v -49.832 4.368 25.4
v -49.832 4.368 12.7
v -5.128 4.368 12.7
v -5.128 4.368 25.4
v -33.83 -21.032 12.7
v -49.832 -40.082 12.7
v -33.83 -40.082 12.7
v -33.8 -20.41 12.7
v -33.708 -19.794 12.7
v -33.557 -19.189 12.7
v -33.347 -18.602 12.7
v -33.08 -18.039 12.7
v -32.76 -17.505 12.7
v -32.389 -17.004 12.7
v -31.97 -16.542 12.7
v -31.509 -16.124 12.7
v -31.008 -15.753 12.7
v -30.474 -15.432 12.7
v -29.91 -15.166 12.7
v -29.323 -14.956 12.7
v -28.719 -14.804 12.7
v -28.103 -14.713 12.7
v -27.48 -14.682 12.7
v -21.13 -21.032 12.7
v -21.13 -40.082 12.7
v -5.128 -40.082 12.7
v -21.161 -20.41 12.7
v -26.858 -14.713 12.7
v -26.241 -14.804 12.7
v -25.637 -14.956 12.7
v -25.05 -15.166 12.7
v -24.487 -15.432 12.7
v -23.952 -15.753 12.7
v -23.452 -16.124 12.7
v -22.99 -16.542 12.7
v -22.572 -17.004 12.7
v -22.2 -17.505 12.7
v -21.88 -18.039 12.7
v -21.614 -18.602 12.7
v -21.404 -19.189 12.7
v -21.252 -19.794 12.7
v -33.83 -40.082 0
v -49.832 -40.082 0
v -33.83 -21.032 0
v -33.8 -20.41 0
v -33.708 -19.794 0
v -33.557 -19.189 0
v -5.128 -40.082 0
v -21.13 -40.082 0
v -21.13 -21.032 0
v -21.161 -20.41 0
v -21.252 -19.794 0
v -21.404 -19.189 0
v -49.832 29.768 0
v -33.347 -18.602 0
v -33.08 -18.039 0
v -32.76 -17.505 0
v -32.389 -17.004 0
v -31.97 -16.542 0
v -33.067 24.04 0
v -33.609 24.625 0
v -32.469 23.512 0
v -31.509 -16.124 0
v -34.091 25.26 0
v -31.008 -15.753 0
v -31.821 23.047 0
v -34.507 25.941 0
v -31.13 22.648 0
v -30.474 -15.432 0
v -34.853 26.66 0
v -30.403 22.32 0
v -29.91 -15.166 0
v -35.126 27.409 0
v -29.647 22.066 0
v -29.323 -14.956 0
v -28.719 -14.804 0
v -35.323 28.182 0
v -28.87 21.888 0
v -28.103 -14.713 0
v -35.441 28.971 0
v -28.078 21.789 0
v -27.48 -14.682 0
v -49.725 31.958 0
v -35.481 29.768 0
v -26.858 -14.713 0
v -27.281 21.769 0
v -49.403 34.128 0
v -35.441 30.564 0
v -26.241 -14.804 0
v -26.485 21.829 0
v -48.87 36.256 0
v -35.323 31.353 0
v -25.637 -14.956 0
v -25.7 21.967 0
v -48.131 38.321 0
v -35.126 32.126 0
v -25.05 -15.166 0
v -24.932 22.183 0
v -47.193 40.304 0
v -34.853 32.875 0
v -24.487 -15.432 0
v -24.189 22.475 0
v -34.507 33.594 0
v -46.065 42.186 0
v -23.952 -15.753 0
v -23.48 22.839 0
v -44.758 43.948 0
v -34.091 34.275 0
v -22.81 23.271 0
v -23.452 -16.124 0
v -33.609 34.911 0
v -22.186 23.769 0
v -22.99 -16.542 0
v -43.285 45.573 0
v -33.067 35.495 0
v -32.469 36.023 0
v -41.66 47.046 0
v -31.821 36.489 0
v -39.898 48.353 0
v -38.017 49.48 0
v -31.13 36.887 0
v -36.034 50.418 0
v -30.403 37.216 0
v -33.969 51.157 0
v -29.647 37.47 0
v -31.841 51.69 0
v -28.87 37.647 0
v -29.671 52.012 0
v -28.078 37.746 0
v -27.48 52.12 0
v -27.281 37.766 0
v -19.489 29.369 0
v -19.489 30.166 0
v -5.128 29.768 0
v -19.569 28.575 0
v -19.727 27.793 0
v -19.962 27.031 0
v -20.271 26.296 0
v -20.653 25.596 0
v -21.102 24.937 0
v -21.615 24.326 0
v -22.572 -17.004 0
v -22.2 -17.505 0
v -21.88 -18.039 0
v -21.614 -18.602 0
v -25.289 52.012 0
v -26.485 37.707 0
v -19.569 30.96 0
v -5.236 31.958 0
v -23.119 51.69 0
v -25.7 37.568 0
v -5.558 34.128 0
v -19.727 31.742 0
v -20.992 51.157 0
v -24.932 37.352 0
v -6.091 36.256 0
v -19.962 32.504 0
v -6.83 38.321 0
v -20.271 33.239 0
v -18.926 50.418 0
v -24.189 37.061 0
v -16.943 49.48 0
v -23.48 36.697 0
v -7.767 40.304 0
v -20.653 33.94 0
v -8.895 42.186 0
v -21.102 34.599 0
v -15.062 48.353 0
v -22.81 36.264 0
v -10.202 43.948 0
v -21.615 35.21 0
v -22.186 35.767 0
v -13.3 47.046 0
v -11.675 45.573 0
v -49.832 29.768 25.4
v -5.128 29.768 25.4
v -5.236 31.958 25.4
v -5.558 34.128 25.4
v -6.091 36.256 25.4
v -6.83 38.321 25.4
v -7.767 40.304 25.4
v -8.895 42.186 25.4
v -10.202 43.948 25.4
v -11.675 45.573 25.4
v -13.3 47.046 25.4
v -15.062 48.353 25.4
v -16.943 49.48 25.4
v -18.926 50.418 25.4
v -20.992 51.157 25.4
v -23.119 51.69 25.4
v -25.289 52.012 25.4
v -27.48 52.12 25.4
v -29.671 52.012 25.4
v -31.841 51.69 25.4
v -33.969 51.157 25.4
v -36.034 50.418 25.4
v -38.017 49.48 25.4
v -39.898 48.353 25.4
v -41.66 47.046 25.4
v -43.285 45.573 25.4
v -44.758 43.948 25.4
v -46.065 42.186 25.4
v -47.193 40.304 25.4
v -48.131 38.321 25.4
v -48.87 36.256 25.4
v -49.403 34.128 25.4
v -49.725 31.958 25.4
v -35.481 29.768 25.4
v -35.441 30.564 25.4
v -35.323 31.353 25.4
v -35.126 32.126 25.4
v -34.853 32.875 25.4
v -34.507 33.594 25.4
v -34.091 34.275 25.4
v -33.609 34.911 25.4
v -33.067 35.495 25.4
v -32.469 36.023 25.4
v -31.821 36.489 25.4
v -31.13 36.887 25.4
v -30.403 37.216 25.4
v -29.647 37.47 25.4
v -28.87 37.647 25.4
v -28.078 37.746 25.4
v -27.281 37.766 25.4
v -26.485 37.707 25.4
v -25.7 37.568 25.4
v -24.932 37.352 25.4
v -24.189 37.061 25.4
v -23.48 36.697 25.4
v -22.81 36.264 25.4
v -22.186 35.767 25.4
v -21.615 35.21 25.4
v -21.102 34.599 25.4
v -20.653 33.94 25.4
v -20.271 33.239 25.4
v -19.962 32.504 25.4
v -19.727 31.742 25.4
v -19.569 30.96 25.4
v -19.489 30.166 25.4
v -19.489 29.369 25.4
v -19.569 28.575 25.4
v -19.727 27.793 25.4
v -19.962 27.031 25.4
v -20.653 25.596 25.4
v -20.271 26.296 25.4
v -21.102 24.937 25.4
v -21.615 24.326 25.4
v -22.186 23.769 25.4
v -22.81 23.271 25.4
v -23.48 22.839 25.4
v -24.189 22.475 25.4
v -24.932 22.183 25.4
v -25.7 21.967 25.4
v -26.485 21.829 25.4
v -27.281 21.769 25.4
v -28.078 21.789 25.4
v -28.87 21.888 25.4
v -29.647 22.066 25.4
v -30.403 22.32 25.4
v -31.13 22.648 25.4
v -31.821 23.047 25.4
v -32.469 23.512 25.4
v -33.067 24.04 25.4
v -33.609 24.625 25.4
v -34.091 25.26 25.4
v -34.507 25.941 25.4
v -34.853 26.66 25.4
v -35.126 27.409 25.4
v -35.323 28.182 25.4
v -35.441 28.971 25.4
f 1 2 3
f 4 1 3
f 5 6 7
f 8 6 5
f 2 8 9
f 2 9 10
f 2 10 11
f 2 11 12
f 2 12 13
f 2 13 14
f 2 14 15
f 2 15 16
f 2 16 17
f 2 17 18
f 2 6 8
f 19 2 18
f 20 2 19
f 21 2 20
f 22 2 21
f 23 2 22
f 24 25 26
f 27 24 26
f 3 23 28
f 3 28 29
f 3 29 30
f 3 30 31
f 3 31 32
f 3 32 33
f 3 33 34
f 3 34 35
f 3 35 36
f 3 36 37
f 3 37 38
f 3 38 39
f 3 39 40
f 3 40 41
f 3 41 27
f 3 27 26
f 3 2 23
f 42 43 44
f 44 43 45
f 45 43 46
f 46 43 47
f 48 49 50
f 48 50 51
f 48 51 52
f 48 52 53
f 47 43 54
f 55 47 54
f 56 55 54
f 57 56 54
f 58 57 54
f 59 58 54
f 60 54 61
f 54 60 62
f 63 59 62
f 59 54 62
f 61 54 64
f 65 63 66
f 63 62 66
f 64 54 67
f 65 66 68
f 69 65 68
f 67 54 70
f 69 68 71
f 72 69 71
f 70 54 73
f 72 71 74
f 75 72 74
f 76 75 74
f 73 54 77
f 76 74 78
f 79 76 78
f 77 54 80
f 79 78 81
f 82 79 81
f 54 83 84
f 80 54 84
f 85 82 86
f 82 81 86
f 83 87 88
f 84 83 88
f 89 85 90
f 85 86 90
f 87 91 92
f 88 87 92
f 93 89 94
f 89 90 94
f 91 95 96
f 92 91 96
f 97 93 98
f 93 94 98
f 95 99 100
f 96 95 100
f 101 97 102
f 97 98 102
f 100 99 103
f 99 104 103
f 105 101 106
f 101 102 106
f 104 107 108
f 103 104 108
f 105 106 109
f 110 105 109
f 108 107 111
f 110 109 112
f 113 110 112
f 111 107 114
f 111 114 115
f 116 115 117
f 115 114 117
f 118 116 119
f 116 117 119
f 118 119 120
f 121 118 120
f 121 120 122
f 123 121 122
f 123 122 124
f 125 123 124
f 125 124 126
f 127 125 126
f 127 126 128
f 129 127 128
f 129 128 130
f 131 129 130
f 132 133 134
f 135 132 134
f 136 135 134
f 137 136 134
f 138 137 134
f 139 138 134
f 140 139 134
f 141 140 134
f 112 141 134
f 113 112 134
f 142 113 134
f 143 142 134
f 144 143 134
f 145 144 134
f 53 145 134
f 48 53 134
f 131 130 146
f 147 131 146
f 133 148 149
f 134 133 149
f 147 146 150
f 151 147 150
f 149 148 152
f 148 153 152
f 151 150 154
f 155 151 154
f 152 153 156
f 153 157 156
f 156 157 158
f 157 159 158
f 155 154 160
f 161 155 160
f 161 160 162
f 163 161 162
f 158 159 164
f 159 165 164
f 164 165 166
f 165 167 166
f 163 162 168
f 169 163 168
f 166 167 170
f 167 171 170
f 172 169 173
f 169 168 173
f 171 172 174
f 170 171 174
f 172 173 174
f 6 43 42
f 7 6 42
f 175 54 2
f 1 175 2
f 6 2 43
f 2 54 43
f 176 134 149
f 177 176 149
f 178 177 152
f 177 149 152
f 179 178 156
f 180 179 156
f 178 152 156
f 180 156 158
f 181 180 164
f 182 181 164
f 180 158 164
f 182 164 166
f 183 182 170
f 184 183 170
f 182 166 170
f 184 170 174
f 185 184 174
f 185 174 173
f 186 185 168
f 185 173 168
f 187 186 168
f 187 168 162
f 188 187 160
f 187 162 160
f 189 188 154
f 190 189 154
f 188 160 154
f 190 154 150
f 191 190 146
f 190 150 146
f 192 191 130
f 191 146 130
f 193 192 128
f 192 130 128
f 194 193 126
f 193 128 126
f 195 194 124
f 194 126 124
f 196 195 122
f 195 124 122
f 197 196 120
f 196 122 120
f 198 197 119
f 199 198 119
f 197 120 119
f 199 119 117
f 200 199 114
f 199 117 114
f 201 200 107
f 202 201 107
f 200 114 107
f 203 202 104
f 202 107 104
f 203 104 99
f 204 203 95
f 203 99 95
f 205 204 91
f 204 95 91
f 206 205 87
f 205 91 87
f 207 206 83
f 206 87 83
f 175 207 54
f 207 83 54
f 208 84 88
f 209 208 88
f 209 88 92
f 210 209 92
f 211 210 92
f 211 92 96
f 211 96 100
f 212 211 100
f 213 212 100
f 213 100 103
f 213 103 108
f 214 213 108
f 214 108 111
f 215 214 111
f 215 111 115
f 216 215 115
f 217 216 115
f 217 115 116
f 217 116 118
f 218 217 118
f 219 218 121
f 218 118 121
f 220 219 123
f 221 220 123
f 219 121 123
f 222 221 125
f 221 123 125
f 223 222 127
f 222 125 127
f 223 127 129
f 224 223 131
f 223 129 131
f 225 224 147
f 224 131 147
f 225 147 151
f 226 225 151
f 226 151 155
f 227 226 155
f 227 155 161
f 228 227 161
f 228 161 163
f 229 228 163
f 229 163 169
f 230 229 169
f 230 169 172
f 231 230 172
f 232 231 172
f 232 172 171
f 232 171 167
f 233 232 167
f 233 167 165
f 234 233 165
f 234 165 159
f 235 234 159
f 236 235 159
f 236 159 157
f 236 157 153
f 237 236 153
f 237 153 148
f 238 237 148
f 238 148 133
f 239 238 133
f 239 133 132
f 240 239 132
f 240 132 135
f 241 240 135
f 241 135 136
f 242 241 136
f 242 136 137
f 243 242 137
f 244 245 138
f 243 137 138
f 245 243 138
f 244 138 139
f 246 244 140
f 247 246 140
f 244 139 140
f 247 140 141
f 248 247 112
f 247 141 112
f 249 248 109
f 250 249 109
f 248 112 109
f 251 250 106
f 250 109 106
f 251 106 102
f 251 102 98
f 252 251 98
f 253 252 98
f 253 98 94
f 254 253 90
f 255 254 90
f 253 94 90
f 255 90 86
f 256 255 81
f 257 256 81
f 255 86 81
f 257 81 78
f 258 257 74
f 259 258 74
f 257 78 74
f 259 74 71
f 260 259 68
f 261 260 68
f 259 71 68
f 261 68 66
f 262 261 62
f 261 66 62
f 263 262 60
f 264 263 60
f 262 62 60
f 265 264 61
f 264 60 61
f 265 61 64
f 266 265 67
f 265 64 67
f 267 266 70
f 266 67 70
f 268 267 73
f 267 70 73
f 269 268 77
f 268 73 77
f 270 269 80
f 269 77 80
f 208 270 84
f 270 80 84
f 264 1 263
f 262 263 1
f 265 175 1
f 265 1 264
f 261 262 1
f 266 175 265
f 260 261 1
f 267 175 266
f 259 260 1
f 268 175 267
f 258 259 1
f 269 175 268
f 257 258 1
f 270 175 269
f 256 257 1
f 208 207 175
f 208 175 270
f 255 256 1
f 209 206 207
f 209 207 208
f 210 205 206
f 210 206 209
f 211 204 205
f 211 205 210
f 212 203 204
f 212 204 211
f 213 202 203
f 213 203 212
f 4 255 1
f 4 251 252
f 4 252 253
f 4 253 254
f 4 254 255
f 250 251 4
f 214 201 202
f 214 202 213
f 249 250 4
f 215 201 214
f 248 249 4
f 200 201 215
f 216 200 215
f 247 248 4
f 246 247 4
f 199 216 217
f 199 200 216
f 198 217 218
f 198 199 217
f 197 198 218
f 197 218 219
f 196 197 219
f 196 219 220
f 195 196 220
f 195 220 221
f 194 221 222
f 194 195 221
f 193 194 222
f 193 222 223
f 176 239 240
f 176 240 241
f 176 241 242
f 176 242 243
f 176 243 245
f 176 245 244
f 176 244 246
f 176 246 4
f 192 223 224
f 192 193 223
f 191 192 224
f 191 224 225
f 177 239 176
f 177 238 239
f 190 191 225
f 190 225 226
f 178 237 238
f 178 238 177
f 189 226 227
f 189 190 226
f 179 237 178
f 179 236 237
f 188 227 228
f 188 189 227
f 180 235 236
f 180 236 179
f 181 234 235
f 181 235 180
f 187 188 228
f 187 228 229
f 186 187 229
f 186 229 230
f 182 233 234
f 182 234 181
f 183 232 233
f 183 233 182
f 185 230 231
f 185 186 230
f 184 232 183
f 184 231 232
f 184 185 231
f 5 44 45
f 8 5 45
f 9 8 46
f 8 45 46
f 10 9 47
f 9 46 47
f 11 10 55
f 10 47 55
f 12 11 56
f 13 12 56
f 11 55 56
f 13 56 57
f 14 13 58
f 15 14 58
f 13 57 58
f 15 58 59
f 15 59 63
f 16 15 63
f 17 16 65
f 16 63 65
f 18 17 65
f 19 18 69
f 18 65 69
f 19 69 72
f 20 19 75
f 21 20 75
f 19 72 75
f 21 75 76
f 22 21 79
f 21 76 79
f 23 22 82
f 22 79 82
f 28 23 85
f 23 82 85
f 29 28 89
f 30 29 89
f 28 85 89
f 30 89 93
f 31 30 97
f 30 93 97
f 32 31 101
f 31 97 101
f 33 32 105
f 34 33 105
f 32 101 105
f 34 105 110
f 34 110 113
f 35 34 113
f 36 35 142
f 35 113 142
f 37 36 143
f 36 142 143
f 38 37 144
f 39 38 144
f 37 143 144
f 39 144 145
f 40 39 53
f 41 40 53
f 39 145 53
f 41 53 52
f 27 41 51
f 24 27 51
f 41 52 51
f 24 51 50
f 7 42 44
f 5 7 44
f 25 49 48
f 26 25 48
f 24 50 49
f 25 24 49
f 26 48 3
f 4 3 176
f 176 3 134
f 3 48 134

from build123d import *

# Parameters (mm, degrees)
F1_DEPTH = 12.7
F3_DEPTH = 12.7
F5_D     = 16.002


with BuildPart() as f1:
    # F0 (on Top) → F1 (new body)
    with BuildSketch(Plane.XY):
        with BuildLine():
            Line((-5.128147, -40.08238), (-5.128147, 29.76762))
            ThreePointArc((-5.128147, 29.76762), (-27.480147, 52.11962), (-49.832147, 29.76762))
            Line((-49.832147, 29.76762), (-49.832147, -40.08238))
            Line((-49.832147, -40.08238), (-33.830147, -40.08238))
            Line((-33.830147, -40.08238), (-33.830147, -21.03238))
            ThreePointArc((-33.830147, -21.03238), (-27.480147, -14.68238), (-21.130147, -21.03238))
            Line((-21.130147, -21.03238), (-21.130147, -40.08238))
            Line((-21.130147, -40.08238), (-5.128147, -40.08238))
        make_face()
    extrude(amount=F1_DEPTH)

    # F2 (on face) → F3 (join)
    with BuildSketch(Plane.XY.offset(12.7)):
        with BuildLine():
            Line((-49.832147, 29.76762), (-49.832147, 4.36762))
            Line((-49.832147, 4.36762), (-5.128147, 4.36762))
            Line((-5.128147, 4.36762), (-5.128147, 29.76762))
            ThreePointArc((-5.128147, 29.76762), (-27.480147, 52.11962), (-49.832147, 29.76762))
        make_face()
    extrude(amount=F3_DEPTH)

    # F5 (through all)
    with Locations(Plane.XY.offset(25.4)):
        with Locations((-27.480147, 29.76762)):
            Hole(F5_D / 2)


solid = f1.part
